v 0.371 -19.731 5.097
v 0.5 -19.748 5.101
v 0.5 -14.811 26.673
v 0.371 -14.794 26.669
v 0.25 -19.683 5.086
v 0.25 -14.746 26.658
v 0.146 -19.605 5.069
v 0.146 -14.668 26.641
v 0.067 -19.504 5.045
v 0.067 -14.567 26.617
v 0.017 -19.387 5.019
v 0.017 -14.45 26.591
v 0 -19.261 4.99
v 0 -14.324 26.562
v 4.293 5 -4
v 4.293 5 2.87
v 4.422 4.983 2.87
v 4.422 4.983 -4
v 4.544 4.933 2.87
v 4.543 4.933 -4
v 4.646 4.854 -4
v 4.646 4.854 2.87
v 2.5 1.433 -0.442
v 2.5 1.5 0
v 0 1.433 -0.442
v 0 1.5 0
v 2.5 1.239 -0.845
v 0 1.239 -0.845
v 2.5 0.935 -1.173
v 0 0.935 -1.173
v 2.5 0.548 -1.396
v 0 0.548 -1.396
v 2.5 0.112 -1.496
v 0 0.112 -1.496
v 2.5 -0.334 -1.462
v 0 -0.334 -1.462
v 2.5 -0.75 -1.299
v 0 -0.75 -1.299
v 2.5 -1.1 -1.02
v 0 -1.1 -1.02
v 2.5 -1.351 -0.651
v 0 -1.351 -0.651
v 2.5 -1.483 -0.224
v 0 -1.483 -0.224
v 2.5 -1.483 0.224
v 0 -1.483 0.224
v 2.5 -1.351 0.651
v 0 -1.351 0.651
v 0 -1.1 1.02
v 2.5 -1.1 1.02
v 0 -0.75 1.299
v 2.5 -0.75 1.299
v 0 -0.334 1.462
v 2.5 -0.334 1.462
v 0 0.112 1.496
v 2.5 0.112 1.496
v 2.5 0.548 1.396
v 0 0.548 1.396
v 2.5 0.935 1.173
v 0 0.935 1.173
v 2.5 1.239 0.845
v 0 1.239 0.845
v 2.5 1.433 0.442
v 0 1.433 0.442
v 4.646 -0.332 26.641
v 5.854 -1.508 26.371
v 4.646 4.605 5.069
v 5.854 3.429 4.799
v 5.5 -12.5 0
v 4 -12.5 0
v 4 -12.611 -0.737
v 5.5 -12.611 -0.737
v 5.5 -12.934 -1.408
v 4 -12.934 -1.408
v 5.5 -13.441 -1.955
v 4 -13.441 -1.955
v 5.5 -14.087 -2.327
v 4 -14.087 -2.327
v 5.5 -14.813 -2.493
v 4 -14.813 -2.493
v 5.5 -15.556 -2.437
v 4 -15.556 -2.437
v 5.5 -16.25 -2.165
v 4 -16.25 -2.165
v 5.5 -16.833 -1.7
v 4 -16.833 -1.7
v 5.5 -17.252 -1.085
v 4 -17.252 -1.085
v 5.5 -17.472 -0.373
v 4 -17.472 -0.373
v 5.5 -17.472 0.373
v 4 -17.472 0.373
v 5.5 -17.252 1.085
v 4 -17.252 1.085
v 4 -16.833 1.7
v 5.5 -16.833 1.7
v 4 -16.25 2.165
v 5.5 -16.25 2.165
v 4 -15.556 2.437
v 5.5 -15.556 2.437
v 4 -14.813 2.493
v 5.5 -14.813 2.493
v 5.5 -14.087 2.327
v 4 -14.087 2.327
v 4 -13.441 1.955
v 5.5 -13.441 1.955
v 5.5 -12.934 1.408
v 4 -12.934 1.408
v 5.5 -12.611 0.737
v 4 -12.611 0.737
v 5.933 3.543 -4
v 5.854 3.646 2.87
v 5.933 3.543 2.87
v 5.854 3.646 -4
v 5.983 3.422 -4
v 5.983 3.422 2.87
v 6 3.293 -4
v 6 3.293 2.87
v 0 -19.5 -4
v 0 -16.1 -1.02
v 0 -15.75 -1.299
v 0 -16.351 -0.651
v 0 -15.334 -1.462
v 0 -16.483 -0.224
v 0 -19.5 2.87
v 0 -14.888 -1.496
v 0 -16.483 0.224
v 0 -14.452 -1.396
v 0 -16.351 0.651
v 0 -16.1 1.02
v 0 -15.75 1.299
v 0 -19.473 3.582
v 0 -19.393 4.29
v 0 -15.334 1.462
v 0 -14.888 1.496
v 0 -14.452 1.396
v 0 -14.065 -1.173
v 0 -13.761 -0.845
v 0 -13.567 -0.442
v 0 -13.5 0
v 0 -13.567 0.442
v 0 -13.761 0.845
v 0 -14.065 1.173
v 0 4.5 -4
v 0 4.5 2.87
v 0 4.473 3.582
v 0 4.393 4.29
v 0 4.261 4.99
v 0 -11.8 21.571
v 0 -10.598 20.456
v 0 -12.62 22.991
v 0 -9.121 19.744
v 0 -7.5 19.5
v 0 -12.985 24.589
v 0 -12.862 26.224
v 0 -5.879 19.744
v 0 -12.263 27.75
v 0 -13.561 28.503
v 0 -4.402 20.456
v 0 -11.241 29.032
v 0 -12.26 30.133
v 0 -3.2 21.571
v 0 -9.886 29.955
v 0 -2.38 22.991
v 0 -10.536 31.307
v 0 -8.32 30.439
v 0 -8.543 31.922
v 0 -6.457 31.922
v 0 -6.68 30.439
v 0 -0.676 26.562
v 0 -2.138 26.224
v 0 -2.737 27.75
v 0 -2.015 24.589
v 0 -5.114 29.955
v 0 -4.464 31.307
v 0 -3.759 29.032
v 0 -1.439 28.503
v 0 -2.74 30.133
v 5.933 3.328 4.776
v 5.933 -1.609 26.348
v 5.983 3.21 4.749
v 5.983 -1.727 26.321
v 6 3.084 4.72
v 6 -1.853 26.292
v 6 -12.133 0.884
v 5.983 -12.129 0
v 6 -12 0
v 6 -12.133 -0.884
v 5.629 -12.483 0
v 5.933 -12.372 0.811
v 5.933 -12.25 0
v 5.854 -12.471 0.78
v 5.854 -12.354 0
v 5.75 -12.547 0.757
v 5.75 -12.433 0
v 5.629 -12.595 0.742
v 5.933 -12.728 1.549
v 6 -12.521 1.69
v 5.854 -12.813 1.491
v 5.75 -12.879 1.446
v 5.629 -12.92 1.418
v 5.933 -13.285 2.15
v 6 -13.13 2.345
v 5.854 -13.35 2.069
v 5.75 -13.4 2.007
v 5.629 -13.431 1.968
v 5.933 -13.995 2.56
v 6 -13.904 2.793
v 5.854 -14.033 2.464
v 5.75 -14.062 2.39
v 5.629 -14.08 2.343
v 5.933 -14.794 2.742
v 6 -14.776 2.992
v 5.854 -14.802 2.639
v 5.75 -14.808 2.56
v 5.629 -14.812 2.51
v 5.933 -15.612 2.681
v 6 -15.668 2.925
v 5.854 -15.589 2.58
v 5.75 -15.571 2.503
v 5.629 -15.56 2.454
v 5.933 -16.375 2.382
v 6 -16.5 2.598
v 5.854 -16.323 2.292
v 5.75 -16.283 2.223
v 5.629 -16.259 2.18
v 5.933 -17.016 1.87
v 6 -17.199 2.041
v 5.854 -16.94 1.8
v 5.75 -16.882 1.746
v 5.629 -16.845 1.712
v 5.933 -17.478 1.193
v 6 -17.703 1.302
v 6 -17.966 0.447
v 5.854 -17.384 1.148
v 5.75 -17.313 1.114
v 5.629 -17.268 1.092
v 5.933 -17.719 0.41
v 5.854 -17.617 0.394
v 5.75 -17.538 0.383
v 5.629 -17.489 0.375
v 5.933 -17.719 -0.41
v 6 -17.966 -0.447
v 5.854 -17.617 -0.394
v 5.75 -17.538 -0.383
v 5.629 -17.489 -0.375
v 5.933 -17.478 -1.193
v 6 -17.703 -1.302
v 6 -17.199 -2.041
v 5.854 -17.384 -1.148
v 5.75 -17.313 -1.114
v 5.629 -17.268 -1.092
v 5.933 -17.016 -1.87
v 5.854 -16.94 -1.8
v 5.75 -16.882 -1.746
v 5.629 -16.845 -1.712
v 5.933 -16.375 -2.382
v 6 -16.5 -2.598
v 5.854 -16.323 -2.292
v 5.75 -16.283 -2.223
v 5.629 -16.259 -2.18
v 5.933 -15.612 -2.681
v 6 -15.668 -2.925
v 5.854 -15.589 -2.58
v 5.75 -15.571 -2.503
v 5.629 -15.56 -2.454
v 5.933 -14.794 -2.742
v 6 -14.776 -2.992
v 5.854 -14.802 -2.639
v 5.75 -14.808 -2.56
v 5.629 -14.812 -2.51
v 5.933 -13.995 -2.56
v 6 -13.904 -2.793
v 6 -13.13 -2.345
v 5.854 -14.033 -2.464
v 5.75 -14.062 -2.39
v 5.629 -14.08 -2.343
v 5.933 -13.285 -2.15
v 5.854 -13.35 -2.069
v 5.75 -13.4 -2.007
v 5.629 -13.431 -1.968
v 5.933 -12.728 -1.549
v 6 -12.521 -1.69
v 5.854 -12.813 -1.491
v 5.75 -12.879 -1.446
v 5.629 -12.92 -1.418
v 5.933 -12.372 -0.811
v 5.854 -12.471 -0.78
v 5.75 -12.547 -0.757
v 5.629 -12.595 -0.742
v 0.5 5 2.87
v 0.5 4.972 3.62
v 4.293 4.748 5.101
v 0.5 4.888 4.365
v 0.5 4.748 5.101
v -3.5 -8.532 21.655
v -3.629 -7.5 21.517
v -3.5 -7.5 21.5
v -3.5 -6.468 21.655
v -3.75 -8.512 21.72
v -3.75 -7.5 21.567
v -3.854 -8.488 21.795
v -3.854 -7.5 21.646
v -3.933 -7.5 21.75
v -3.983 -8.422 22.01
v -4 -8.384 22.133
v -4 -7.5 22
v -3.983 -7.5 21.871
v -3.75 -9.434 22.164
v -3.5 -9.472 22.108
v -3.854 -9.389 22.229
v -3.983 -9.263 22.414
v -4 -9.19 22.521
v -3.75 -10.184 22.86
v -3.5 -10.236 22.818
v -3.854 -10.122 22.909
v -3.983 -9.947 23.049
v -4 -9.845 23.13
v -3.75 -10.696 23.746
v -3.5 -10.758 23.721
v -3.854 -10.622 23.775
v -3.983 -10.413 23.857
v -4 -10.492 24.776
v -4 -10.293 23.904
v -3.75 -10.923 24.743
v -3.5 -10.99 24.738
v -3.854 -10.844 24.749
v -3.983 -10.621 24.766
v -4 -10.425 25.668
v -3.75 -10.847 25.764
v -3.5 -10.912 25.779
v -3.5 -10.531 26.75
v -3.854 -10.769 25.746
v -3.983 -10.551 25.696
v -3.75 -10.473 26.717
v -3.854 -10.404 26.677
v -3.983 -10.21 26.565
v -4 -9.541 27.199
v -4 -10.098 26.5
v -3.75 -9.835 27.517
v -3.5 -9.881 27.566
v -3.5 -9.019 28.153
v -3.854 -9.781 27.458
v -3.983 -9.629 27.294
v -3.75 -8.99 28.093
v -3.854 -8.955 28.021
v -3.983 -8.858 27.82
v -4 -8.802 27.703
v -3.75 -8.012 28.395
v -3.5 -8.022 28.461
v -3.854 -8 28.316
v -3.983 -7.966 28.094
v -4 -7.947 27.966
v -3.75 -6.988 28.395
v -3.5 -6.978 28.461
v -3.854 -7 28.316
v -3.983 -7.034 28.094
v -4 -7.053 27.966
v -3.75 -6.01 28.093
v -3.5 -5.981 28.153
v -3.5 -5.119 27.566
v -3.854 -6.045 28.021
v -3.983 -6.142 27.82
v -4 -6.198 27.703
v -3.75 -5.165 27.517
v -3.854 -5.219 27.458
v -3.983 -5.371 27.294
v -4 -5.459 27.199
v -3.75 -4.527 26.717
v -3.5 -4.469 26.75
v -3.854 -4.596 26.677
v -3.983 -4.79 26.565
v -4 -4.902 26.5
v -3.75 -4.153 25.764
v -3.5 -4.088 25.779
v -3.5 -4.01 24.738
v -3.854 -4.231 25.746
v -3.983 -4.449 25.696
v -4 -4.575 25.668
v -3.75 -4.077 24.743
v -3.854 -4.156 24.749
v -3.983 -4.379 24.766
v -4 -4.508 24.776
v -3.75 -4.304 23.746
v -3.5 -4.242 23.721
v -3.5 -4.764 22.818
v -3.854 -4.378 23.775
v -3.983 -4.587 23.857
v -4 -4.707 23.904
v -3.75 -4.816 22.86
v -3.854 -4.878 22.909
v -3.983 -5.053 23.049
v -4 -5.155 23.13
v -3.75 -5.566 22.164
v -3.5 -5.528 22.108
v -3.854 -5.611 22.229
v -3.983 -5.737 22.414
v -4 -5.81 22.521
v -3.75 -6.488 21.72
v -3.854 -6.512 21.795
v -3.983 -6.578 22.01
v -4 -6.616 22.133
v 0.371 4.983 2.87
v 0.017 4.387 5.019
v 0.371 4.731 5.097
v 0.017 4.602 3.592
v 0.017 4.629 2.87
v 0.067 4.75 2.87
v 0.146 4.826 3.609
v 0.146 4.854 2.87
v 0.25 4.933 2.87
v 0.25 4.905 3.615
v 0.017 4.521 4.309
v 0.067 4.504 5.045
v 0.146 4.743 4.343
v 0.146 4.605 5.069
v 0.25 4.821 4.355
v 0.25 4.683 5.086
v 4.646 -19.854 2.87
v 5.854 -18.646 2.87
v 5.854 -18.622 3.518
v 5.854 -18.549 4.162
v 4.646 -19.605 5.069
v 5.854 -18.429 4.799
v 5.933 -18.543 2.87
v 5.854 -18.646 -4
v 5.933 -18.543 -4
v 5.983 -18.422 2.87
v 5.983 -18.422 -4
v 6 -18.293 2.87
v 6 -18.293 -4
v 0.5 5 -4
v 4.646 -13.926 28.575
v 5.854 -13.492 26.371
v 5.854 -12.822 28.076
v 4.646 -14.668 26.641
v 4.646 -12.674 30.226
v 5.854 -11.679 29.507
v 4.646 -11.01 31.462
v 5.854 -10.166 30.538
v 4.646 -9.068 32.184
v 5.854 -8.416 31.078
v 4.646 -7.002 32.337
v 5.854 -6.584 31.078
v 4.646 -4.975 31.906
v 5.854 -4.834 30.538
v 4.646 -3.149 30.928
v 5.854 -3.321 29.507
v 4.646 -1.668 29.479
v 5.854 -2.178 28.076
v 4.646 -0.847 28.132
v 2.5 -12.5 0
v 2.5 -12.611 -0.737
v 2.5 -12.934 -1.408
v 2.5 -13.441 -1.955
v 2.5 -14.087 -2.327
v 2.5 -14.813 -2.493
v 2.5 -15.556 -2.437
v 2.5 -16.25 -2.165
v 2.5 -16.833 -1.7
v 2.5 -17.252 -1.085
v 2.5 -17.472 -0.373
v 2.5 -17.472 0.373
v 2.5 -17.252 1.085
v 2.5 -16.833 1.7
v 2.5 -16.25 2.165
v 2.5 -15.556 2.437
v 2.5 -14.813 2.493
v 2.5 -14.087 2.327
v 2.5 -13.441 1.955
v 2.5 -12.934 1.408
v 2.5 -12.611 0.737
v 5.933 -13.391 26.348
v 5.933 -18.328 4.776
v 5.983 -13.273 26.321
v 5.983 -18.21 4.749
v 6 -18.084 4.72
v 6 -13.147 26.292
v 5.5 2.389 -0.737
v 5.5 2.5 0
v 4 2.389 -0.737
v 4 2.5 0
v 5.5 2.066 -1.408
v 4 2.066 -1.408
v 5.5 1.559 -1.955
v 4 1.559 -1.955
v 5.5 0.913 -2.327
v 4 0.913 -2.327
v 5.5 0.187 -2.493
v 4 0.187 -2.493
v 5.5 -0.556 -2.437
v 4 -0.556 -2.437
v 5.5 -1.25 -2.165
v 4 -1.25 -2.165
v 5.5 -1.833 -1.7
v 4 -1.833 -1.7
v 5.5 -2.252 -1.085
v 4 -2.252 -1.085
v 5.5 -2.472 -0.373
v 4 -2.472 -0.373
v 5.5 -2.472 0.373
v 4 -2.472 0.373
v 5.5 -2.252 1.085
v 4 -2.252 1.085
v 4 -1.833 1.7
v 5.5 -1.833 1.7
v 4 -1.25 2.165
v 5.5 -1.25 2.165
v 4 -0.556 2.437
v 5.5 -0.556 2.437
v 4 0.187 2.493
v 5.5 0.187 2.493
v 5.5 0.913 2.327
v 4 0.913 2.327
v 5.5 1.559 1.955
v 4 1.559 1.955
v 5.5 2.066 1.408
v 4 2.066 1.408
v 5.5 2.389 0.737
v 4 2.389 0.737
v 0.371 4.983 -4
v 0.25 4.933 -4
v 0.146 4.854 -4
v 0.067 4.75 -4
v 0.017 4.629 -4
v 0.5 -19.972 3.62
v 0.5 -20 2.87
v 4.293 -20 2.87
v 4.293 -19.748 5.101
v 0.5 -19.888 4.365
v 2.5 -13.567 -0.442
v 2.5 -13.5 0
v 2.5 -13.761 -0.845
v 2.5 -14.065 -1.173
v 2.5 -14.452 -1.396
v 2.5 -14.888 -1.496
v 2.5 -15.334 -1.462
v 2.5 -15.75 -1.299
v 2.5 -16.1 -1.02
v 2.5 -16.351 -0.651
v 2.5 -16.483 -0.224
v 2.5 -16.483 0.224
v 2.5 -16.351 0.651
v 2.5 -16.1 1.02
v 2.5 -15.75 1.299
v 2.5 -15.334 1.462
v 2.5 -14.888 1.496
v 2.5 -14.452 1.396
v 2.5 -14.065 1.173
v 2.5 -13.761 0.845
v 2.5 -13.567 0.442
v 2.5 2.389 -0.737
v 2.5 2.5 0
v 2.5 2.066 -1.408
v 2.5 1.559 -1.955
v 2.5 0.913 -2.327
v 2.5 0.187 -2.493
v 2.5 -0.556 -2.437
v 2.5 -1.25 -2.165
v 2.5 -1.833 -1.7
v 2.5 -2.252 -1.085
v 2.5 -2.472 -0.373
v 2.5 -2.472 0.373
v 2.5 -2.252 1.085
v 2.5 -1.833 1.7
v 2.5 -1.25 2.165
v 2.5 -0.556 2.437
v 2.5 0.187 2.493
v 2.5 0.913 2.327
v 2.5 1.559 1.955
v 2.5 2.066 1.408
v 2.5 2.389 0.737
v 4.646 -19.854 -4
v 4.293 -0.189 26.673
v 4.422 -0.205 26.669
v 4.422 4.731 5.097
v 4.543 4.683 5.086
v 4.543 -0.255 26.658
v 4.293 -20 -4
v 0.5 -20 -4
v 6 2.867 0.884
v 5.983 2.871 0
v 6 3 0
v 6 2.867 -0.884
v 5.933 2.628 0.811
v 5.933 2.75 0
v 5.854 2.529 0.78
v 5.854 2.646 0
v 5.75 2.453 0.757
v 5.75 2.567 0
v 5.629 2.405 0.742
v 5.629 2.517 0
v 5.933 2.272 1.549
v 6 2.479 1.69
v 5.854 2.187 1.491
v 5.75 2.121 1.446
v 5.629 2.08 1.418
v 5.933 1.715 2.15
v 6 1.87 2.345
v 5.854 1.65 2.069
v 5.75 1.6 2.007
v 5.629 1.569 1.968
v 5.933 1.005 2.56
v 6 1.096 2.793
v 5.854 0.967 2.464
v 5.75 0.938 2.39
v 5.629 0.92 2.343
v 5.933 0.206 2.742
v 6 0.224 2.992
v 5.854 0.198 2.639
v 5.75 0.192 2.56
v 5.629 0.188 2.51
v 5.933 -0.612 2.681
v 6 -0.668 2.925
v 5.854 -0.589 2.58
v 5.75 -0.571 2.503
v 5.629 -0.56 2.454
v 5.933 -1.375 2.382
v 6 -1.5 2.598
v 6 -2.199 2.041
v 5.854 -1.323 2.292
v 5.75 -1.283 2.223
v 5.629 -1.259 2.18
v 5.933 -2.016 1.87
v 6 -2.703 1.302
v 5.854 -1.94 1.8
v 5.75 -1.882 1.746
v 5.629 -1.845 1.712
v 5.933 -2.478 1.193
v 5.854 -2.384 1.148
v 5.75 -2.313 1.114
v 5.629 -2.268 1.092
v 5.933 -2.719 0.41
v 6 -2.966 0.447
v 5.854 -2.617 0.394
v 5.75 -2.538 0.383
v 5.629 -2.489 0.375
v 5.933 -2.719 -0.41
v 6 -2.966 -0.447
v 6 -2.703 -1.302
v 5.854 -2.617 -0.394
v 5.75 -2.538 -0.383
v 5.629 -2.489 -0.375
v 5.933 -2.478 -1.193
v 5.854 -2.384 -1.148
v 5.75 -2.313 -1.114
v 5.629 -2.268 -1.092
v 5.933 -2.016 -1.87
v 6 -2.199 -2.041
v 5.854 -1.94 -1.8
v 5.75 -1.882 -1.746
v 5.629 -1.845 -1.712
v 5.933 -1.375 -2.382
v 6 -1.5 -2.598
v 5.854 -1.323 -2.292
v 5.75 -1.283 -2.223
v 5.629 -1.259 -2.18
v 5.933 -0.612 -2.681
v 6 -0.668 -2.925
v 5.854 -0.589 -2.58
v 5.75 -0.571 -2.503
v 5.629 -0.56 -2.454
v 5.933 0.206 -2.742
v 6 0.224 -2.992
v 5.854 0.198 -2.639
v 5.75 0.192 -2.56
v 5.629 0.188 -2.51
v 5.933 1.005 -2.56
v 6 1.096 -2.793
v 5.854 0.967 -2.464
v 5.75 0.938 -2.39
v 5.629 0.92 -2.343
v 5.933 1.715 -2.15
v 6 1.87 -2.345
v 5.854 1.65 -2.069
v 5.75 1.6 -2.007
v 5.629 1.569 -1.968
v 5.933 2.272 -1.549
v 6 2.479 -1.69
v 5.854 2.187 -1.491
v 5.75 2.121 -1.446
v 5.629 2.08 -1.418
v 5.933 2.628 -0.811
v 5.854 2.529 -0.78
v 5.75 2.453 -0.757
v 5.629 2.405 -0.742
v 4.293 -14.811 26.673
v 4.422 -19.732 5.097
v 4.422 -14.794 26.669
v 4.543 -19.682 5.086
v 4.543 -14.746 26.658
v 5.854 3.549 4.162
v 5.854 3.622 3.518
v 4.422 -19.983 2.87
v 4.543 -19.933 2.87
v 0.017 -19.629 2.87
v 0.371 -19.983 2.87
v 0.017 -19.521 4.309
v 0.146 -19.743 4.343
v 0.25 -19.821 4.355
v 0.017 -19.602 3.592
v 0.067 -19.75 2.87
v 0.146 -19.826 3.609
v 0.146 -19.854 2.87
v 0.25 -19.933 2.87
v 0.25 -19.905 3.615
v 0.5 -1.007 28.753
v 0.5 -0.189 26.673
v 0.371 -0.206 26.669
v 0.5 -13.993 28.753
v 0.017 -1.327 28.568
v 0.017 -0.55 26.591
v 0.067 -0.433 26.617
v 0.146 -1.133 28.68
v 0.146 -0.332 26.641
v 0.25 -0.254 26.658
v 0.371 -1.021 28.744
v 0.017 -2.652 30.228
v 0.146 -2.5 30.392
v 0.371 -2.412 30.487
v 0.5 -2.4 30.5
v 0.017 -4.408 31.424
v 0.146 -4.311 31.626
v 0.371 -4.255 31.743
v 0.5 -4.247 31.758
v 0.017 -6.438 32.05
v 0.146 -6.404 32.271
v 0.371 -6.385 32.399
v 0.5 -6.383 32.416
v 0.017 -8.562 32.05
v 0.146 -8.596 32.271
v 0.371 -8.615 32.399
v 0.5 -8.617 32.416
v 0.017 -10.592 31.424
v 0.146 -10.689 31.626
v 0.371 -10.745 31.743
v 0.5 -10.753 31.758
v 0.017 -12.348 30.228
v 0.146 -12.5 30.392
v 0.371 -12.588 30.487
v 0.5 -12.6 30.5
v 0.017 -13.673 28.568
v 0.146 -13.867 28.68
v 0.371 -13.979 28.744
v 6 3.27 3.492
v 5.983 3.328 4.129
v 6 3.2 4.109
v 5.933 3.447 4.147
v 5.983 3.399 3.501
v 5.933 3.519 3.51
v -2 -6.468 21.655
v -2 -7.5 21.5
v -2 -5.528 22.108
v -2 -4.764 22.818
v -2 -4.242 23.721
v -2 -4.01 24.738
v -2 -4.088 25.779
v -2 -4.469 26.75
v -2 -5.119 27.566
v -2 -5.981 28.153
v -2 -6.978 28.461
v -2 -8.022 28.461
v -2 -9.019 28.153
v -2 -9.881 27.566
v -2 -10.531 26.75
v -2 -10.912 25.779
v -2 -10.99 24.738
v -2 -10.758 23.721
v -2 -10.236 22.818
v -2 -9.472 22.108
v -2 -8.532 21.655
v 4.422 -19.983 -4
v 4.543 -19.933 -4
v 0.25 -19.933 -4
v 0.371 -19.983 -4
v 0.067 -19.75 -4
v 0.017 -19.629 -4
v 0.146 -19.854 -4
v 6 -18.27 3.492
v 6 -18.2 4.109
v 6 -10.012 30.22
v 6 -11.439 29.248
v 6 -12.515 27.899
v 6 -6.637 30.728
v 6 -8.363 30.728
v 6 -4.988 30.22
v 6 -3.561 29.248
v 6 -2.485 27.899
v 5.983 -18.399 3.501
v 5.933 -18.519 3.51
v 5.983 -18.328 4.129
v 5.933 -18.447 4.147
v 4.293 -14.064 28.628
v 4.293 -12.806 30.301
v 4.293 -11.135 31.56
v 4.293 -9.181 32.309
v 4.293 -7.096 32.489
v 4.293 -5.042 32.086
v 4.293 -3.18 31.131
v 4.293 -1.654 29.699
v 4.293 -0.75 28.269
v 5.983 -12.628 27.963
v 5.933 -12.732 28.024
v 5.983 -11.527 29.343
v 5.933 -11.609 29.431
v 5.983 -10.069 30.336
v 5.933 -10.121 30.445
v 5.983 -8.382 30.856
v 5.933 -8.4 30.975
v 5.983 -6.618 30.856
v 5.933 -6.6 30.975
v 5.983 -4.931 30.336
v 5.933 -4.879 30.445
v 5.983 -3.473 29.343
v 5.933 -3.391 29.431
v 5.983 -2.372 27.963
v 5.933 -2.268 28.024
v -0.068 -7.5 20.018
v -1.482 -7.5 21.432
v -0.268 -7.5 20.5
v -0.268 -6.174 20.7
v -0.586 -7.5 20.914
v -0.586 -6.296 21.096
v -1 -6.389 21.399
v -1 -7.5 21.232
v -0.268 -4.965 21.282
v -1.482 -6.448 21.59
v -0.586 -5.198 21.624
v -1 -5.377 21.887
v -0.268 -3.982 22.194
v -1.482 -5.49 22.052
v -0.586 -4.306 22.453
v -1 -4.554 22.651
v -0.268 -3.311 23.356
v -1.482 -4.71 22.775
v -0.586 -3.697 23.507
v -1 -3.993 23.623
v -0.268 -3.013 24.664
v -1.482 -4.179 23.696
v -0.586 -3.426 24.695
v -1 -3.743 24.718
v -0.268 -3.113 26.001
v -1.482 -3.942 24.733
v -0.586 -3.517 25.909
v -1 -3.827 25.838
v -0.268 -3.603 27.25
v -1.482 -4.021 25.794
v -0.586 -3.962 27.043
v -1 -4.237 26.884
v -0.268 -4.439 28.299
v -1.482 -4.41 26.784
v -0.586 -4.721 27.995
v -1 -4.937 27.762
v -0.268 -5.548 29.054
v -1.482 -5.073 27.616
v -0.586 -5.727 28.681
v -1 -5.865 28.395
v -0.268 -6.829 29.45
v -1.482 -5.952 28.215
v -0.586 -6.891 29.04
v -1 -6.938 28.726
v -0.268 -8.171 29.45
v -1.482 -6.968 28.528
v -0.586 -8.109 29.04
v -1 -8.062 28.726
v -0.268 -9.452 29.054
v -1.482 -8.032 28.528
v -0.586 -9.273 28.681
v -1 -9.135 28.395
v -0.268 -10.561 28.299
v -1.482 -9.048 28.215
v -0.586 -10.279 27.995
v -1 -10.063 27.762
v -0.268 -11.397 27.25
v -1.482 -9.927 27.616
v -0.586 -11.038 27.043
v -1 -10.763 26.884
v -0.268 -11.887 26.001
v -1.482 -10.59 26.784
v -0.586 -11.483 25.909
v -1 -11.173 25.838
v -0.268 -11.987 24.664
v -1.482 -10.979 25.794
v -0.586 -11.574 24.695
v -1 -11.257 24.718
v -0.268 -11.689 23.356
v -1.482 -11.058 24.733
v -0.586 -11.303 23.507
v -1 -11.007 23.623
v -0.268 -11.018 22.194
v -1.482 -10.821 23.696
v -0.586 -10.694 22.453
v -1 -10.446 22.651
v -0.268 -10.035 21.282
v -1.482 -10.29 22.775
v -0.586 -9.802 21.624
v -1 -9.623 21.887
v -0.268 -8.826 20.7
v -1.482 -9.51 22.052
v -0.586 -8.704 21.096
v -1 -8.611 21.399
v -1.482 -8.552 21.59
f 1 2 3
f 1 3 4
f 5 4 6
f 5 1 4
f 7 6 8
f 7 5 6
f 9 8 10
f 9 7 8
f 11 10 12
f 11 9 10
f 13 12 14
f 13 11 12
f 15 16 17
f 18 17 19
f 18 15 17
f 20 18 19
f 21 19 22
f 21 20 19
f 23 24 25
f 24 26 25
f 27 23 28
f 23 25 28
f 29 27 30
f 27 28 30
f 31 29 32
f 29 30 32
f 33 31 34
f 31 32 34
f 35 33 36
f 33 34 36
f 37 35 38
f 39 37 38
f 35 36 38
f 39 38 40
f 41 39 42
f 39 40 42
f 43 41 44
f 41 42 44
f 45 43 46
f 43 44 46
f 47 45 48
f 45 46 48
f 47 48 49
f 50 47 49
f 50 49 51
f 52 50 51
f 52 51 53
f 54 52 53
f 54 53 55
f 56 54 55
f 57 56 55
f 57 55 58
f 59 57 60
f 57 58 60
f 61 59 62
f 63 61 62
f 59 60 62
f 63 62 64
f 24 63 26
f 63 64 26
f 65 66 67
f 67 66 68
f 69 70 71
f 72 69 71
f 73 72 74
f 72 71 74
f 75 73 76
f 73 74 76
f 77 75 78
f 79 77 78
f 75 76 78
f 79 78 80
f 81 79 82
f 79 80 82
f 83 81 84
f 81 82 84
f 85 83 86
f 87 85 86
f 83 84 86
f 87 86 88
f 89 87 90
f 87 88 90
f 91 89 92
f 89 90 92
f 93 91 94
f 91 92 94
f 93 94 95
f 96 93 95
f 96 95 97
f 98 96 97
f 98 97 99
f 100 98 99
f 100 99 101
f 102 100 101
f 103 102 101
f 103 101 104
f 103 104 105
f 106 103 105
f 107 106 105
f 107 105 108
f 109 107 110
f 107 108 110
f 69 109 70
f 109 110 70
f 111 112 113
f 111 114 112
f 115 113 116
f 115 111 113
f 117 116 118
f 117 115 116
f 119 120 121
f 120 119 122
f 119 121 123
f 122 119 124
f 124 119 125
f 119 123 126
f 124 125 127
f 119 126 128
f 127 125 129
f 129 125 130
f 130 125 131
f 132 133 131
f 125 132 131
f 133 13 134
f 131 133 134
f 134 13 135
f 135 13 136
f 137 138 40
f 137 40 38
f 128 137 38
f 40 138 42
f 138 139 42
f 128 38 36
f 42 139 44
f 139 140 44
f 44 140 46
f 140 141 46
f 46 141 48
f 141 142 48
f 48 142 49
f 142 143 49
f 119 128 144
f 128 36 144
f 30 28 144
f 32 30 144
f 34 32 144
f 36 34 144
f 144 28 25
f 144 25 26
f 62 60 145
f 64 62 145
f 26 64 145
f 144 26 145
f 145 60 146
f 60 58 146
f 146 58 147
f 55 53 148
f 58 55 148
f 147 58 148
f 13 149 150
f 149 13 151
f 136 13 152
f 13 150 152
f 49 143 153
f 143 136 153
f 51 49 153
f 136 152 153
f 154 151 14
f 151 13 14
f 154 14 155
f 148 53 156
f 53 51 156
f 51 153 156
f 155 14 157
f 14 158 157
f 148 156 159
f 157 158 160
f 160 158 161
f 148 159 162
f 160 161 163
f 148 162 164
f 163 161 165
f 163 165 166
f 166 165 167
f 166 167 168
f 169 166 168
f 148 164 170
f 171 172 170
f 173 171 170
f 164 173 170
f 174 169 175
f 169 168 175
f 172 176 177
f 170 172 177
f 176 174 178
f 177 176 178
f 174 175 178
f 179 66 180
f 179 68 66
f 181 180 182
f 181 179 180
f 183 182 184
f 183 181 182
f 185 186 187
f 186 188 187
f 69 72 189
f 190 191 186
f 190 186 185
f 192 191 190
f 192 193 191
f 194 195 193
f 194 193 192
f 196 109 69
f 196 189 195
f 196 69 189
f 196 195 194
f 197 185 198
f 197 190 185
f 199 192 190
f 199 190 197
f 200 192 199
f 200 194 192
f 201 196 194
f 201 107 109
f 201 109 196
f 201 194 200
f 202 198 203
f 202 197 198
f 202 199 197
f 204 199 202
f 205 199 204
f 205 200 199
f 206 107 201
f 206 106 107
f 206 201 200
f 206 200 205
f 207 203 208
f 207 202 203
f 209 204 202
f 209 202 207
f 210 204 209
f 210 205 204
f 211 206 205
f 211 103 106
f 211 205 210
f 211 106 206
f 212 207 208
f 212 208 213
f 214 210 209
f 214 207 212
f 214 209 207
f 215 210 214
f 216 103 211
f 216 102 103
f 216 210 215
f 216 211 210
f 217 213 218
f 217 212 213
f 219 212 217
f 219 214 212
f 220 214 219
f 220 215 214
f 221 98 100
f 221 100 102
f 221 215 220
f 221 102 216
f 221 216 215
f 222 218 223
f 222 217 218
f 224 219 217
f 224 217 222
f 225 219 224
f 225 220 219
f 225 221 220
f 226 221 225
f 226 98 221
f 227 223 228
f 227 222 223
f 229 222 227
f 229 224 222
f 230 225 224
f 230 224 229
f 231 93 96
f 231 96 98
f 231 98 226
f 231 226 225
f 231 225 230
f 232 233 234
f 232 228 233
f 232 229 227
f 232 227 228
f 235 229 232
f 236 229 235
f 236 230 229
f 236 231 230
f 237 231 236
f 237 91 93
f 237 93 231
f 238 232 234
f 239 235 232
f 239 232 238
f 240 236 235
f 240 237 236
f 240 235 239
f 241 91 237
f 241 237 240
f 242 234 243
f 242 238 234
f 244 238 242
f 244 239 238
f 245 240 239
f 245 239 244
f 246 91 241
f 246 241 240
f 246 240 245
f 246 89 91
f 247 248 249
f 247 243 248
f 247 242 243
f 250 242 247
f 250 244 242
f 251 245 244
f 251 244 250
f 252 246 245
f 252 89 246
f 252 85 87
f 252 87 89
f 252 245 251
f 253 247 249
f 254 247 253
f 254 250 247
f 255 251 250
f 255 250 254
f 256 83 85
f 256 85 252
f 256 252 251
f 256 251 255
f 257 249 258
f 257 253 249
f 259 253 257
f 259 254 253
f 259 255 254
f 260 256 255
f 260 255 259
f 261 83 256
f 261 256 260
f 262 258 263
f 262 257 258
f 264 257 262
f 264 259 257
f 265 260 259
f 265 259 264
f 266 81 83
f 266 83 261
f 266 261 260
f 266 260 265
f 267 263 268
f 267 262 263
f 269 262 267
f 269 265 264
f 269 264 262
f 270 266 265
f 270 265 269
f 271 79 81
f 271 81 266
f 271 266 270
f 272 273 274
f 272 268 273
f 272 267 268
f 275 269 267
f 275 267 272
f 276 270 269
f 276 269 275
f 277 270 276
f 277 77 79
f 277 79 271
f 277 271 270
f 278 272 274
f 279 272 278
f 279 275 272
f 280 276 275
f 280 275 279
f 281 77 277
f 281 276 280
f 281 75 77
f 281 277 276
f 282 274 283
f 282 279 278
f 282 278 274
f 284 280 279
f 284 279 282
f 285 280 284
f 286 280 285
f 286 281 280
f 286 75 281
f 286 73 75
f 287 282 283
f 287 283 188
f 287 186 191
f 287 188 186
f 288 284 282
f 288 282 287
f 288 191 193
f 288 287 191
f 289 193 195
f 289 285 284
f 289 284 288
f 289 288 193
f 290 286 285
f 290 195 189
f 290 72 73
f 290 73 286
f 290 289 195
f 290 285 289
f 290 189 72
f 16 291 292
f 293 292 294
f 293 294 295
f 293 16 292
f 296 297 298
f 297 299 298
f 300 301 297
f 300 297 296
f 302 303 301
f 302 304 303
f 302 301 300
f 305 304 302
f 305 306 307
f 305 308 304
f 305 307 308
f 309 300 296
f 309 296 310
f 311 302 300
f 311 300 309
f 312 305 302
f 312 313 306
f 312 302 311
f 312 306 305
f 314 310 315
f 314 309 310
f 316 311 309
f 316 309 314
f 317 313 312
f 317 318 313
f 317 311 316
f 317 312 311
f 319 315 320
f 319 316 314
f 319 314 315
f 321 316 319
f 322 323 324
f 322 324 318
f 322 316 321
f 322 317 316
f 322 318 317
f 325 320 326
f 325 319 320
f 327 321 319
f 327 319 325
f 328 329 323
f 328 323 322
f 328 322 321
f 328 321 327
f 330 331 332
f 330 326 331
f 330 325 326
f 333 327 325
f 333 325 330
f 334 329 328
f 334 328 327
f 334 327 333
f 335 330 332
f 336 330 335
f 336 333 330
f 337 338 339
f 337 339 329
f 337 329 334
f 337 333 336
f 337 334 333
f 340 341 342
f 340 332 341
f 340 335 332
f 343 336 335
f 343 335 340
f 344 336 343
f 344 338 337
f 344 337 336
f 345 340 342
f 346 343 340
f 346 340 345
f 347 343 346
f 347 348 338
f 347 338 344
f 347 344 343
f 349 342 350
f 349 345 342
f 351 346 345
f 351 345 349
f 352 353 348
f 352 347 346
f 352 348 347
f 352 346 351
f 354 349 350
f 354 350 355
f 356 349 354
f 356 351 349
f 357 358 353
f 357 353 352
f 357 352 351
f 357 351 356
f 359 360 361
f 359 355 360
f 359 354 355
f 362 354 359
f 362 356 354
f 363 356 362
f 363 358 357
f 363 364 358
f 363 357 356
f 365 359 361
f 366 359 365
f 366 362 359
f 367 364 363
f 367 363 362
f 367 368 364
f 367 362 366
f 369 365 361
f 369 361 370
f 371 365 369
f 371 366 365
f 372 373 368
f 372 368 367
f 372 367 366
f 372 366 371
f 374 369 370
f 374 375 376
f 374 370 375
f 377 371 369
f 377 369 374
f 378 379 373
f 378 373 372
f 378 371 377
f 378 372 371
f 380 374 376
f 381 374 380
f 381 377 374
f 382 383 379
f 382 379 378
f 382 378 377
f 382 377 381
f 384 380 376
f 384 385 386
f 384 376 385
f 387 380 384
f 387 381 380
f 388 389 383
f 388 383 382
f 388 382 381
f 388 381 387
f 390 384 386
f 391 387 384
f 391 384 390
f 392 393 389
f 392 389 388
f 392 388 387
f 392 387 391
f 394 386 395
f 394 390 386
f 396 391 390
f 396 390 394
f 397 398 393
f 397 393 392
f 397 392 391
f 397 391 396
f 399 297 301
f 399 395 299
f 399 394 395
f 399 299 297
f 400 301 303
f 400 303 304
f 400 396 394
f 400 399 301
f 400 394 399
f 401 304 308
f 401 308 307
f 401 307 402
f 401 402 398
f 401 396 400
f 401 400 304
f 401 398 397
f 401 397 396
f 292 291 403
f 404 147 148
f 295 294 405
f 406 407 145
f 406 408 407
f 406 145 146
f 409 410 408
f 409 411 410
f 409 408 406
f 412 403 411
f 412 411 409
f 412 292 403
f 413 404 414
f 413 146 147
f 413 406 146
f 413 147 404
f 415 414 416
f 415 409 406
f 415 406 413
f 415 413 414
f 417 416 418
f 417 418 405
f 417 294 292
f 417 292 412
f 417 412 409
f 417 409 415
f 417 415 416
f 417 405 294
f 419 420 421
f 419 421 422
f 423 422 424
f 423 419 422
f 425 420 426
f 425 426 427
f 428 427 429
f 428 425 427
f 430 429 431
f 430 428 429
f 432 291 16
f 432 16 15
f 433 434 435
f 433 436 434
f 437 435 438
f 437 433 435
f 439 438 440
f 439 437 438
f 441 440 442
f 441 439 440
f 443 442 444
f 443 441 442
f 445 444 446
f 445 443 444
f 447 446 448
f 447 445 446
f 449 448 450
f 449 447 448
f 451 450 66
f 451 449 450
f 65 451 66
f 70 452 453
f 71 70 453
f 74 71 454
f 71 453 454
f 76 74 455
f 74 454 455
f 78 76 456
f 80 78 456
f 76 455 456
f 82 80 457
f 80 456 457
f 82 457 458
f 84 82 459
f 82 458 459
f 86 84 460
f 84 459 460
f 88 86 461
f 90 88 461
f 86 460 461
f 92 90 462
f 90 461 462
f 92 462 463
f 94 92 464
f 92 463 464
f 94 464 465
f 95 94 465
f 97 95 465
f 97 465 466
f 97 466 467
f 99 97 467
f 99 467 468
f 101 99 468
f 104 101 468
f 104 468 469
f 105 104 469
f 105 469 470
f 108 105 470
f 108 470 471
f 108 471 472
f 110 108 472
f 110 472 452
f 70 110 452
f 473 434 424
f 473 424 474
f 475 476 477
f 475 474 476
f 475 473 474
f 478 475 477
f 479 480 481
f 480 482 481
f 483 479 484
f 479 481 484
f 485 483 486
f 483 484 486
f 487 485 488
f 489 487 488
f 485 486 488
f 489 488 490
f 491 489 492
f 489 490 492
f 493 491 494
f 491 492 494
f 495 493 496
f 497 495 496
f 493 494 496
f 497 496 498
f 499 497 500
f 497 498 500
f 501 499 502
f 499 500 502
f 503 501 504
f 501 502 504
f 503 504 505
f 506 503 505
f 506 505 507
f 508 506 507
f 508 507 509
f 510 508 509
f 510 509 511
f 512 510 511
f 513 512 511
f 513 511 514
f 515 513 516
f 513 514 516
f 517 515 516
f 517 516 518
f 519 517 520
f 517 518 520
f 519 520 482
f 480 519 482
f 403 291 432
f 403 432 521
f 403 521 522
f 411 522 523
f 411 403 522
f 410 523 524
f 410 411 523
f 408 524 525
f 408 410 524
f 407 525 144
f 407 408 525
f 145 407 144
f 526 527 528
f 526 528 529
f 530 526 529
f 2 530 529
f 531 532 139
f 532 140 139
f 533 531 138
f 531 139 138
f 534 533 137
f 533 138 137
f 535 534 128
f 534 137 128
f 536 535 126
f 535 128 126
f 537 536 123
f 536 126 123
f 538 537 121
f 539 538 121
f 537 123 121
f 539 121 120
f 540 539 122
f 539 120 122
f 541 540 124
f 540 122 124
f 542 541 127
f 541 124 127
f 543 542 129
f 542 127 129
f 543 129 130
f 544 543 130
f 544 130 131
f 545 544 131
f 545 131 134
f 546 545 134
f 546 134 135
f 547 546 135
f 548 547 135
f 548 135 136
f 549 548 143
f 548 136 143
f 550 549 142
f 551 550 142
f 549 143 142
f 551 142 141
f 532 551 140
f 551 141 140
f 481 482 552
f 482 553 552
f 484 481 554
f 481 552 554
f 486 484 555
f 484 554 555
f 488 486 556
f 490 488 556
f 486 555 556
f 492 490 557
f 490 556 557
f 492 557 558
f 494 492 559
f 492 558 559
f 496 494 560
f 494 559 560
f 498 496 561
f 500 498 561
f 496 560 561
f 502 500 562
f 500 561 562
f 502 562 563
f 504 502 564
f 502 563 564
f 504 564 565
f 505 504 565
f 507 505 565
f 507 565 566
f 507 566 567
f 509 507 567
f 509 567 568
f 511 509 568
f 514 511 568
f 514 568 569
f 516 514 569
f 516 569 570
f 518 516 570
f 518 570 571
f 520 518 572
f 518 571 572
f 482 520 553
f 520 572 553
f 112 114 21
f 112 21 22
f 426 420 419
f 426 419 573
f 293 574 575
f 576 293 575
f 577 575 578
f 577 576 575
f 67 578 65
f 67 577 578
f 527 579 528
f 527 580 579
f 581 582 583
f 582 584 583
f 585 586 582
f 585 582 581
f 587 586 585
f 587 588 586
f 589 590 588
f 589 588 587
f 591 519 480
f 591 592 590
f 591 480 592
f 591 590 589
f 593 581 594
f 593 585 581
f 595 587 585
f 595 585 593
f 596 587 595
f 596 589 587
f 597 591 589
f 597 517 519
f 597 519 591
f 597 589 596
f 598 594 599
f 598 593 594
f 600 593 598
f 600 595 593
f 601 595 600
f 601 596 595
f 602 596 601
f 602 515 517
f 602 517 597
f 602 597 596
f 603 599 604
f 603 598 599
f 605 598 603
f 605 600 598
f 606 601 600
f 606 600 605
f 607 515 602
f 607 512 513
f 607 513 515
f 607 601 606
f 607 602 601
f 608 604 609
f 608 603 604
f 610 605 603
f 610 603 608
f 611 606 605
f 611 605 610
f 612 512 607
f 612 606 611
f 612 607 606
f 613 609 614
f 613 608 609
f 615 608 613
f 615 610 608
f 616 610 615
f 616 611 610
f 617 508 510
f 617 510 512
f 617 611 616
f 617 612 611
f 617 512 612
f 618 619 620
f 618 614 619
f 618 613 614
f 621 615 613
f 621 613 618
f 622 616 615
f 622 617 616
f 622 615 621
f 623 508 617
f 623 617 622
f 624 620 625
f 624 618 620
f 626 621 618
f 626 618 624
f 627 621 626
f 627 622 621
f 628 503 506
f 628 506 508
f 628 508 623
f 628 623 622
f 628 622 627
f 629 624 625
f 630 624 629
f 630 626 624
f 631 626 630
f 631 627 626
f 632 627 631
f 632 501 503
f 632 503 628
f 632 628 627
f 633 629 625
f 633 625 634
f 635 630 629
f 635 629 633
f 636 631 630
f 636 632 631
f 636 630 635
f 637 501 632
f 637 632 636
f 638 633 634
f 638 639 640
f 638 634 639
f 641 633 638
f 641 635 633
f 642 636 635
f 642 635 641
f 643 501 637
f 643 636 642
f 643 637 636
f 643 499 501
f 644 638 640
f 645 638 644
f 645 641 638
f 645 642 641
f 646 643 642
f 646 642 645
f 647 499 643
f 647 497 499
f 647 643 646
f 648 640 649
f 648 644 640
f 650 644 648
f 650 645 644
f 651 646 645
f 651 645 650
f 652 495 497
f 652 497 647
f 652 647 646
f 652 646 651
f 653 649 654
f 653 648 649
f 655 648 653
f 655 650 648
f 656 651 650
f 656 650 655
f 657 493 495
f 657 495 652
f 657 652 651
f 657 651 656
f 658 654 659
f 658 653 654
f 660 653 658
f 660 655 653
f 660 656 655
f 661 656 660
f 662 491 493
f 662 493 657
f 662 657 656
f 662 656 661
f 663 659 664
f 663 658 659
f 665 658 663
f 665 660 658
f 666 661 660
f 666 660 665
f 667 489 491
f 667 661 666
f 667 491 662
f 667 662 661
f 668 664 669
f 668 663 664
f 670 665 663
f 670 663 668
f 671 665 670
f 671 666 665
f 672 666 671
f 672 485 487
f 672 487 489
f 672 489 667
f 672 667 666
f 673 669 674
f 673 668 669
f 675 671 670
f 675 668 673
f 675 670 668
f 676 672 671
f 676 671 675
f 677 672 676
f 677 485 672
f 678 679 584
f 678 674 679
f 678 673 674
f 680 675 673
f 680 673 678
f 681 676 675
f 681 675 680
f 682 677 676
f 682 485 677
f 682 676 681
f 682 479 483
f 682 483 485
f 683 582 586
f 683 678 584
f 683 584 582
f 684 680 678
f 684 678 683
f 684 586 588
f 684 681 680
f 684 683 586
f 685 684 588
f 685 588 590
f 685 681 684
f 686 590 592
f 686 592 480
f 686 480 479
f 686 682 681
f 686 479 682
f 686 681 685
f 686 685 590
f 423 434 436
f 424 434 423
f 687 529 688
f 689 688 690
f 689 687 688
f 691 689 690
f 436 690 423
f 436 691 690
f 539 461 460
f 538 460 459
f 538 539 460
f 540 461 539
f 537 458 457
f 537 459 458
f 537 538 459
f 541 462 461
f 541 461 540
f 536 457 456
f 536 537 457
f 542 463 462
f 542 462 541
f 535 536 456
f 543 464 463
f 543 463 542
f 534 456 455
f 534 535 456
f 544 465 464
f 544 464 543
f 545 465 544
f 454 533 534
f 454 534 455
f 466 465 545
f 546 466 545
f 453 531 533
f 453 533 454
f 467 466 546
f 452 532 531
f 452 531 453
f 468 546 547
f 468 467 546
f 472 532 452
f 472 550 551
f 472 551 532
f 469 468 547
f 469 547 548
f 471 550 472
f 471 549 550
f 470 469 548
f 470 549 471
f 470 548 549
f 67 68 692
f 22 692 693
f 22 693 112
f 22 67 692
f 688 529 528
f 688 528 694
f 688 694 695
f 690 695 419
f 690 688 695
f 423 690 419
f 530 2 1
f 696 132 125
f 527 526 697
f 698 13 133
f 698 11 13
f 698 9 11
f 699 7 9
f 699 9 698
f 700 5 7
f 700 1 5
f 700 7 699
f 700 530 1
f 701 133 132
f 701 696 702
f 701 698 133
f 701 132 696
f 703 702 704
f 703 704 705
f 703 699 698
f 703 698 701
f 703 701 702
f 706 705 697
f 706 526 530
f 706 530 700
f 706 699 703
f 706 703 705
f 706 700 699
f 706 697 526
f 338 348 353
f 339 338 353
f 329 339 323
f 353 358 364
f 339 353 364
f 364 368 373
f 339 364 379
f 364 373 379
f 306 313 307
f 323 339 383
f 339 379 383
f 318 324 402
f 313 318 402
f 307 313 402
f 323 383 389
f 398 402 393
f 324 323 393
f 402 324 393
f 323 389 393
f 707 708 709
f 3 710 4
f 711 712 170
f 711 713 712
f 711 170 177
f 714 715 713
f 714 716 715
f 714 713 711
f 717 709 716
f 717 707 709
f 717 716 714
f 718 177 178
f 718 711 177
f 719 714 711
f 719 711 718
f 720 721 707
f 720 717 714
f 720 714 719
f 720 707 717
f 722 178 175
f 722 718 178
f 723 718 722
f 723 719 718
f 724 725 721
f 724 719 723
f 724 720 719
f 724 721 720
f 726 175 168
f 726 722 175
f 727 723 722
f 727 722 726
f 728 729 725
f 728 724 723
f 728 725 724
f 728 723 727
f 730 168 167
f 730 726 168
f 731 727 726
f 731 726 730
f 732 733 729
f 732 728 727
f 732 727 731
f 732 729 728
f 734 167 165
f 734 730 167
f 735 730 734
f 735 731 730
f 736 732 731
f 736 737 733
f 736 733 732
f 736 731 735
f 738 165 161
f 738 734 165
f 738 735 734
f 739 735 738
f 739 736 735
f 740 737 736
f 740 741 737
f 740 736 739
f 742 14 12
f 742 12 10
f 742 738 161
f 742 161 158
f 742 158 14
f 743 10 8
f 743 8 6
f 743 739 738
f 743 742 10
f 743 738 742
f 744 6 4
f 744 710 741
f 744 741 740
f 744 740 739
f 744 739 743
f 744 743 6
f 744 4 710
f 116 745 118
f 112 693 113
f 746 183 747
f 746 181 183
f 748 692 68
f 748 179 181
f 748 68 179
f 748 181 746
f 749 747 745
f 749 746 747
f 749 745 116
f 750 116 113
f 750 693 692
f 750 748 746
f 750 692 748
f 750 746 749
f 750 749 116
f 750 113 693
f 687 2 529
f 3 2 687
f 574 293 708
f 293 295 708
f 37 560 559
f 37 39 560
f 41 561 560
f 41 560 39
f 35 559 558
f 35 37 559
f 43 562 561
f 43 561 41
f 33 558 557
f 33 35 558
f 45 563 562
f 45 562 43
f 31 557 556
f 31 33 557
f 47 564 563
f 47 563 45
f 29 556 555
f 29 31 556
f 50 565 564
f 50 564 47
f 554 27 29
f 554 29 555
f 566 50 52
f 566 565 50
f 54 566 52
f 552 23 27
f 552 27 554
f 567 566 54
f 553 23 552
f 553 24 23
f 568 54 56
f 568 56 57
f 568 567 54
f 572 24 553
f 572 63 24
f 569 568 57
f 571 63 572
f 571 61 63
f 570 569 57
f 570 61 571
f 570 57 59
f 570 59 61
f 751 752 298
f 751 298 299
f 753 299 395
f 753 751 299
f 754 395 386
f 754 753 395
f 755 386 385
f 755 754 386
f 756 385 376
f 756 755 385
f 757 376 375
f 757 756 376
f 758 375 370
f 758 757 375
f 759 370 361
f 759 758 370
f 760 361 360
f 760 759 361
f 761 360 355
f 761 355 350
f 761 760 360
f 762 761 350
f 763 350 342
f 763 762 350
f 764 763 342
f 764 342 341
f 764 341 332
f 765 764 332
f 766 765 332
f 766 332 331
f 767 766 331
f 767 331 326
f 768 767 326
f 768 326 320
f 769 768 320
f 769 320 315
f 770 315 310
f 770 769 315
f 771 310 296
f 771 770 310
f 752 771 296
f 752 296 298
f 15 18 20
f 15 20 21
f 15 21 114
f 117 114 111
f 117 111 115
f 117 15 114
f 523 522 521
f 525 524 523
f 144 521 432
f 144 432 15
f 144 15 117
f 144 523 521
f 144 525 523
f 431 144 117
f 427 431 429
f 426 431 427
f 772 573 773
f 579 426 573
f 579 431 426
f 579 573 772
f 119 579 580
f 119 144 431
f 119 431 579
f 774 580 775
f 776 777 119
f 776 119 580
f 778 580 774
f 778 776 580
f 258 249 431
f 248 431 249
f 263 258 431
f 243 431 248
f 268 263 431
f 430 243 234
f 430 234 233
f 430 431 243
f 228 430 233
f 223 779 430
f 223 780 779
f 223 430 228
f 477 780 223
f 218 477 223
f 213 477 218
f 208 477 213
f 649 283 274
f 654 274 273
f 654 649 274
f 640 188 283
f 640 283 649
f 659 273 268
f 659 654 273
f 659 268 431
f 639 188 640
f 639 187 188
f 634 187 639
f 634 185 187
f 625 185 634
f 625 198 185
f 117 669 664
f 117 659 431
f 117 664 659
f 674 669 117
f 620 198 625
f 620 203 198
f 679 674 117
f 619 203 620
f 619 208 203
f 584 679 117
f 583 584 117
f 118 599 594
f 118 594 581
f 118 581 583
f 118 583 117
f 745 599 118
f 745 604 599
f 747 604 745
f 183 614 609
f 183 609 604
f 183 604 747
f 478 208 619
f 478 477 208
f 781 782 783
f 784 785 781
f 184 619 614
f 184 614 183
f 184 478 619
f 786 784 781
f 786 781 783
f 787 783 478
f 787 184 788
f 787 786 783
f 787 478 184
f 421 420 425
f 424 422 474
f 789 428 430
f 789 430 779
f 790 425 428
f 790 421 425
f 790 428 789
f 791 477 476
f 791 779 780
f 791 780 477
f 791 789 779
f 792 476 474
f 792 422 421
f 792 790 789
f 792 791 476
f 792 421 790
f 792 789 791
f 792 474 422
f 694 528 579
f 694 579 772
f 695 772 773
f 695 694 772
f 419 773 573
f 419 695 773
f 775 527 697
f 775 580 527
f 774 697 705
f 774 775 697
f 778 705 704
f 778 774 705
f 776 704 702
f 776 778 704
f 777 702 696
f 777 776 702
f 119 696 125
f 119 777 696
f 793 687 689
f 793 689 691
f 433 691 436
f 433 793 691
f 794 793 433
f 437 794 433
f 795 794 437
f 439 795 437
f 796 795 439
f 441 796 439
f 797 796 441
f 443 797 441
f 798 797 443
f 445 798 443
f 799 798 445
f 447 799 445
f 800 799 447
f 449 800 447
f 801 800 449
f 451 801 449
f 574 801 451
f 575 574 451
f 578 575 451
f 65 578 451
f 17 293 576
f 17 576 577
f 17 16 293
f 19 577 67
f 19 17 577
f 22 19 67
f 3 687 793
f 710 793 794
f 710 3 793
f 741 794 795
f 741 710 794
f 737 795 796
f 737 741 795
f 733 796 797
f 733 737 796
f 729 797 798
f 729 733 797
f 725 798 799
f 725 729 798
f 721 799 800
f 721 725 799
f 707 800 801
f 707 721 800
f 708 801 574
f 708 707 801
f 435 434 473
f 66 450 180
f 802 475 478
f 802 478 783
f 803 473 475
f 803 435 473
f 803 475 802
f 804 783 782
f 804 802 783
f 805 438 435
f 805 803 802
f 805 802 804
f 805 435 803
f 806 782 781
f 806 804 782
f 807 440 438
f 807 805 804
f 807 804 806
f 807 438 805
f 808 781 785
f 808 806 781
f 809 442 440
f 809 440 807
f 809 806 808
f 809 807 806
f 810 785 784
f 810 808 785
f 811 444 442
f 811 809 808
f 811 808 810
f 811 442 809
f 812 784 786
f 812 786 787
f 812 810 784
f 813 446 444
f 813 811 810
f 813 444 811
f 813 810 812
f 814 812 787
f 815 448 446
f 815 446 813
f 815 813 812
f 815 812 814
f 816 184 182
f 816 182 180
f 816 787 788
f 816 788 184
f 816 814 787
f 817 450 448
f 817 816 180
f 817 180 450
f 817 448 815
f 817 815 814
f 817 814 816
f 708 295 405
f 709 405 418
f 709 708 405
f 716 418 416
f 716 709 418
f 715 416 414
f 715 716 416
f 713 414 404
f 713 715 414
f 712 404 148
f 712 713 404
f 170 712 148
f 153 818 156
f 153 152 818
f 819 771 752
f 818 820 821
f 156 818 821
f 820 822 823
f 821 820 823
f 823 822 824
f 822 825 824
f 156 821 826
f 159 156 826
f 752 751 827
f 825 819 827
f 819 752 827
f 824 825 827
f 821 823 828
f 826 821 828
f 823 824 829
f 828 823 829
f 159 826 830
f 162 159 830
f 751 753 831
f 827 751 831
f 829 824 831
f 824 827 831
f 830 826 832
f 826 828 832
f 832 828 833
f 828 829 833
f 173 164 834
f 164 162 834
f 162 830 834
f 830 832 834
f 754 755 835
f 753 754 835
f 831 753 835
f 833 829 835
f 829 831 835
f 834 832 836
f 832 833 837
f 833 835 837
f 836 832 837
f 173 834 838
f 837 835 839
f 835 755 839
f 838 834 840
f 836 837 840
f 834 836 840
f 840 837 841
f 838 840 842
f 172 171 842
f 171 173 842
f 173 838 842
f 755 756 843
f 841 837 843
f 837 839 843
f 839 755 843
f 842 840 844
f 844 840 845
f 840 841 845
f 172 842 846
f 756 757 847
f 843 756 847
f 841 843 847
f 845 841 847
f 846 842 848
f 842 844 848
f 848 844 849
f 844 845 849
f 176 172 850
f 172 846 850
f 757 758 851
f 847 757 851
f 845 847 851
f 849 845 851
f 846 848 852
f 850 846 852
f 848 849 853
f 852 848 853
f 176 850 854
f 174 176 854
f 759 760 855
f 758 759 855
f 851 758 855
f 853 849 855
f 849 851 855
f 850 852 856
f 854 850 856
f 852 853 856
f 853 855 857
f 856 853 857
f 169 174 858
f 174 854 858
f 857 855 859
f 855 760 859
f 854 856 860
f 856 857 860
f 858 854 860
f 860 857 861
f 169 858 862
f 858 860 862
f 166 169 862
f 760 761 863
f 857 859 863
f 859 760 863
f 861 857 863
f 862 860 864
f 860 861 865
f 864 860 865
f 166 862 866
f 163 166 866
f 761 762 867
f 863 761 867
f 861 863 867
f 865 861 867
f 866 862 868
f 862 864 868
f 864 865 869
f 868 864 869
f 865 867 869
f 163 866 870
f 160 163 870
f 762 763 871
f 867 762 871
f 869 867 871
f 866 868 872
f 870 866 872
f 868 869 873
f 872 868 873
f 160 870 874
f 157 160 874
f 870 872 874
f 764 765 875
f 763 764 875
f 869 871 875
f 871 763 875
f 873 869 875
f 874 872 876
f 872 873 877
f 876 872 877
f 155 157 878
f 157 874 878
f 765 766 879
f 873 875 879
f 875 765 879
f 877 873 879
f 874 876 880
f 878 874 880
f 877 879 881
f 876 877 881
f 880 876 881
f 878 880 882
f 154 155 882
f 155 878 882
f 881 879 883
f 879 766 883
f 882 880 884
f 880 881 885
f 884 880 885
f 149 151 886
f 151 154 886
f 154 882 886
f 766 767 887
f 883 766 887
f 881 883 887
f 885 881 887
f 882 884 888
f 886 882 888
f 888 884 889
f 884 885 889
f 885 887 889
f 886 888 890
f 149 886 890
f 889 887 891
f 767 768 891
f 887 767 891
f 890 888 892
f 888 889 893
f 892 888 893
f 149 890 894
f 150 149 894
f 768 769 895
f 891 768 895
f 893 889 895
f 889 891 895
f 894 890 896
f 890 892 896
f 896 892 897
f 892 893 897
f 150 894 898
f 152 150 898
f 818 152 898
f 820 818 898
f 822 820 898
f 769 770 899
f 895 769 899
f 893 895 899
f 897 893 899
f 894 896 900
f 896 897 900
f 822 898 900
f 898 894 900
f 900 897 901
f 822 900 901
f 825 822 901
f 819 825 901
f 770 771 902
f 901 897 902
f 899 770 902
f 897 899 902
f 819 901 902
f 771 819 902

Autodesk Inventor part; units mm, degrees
ref_plane "YZ Plane" through (0, 0, 0) normal (1, 0, 0) x (0, 1, 0)
ref_plane "XZ Plane" through (0, 0, 0) normal (0, 1, 0) x (-1, 0, 0)
ref_plane "XY Plane" through (0, 0, 0) normal (0, 0, 1) x (1, 0, 0)
sketch "스케치1" plane through (0, 0, 0) normal (1, 0, 0) x (0, 1, 0)
  circle A0 centre (0, 0) radius 1.5
  circle A1 centre (0, 0) radius 2.5
  line L0 (0, 0) -> (0, -4)
  line L1 (0, -4) -> (5, -4)
  line L2 (5, -4) -> (-20, -4)
  line L3 (-20, -4) -> (-20, 4)
  line L4 (-20, 4) -> (5, 4)
  line L5 (5, 4) -> (5, -4)
  circle A2 centre (-15, 0) radius 1.5
  circle A3 centre (-15, 0) radius 2.5
  line L6 (-15, 0) -> (-15, 25)
  line L7 (-15, 25) -> (-7.5, 25)
  circle A4 centre (-7.5, 25) radius 3.5
  circle A5 centre (-7.5, 25) radius 7.5
  line L8 (5, 4) -> (-0.189, 26.6732)
  line L9 (-20, 4) -> (-14.811, 26.6732)
  point P0 (-14.811, 26.6732)
  dimension "d0" = 3
  dimension "d1" = 5
  dimension "d2" = 4
  dimension "d3" = 5
  dimension "d4" = 25
  dimension "d5" = 8
  dimension "d8" = 15
  dimension "d13" = 25
  dimension "d14" = 7.5
  dimension "d15" = 7
  dimension "d16" = 15
extrude "돌출1" add sketch "스케치1" along normal blind 4 contours L2 L3 L4 L5 L1 | L4 L6 A5 L8 | L9 A5 L6 L4 | A5
extrude "돌출2" add sketch "스케치1" along normal blind 2 contours A1 | A3
sketch "스케치2" plane through (4, 0, 0) normal (1, 0, 0) x (0, 0, -1)
  circle A0 centre (-25, -7.5) radius 3.5 projected
  circle A1 centre (-25, -7.5) radius 3.5
  point P0 (0, 0)
extrude "돌출3" add sketch "스케치2" against normal blind 8
move faces "이동2" translate (2, 0, 0) faces at (4, -5.2955, 18.5613)
fillet "모깎기1" radius 2 1 edges at (0, -7.5, 28.5)
fillet "모깎기2" radius 10 2 edges at (3, 5, 4) (3, -20, 4)
chamfer "모따기1" distance 1.5 angle 45 7 edges at (6, -17.2795, 15.8872) (6, -19.9368, 3.9929) (6, -20, -0.5649) (6, -7.5, 32.5) (6, 2.2795, 15.8872) (6, 4.9368, 3.9929) (6, 5, -0.5649)
fillet "모깎기3" radius 0.5 14 edges at (6, -7.5, 31) (6, 0.8173, 15.5526) (6, 3.4463, 3.8245) (6, 3.5, -0.5649) (6, -18.4463, 3.8245) (6, -18.5, -0.5649) (6, -15.8173, 15.5526) (4.5, -19.9368, 3.9929) (4.5, -20, -0.5649) (4.5, -7.5, 32.5) (4.5, 2.2795, 15.8872) (4.5, 4.9368, 3.9929) (4.5, 5, -0.5649) (4.5, -17.2795, 15.8872)
fillet "모깎기4" radius 0.5 7 edges at (0, -19.9368, 3.9929) (0, -17.2795, 15.8872) (0, -7.5, 32.5) (0, 2.2795, 15.8872) (0, 4.9368, 3.9929) (0, 5, -0.5649) (0, -20, -0.5649)
fillet "모깎기5" radius 0.5 1 edges at (-4, -7.5, 28.5)
move faces "이동1" translate (0.5, 0, 0) faces at (2, -12.8575, 0.1994) (2, 2.1279, 0.3191)
fillet "모깎기6" radius 0.5 2 edges at (6, -2.5, 0) (6, -17.5, 0)
properties part number "롤축지지대베어링_3D 인쇄"
